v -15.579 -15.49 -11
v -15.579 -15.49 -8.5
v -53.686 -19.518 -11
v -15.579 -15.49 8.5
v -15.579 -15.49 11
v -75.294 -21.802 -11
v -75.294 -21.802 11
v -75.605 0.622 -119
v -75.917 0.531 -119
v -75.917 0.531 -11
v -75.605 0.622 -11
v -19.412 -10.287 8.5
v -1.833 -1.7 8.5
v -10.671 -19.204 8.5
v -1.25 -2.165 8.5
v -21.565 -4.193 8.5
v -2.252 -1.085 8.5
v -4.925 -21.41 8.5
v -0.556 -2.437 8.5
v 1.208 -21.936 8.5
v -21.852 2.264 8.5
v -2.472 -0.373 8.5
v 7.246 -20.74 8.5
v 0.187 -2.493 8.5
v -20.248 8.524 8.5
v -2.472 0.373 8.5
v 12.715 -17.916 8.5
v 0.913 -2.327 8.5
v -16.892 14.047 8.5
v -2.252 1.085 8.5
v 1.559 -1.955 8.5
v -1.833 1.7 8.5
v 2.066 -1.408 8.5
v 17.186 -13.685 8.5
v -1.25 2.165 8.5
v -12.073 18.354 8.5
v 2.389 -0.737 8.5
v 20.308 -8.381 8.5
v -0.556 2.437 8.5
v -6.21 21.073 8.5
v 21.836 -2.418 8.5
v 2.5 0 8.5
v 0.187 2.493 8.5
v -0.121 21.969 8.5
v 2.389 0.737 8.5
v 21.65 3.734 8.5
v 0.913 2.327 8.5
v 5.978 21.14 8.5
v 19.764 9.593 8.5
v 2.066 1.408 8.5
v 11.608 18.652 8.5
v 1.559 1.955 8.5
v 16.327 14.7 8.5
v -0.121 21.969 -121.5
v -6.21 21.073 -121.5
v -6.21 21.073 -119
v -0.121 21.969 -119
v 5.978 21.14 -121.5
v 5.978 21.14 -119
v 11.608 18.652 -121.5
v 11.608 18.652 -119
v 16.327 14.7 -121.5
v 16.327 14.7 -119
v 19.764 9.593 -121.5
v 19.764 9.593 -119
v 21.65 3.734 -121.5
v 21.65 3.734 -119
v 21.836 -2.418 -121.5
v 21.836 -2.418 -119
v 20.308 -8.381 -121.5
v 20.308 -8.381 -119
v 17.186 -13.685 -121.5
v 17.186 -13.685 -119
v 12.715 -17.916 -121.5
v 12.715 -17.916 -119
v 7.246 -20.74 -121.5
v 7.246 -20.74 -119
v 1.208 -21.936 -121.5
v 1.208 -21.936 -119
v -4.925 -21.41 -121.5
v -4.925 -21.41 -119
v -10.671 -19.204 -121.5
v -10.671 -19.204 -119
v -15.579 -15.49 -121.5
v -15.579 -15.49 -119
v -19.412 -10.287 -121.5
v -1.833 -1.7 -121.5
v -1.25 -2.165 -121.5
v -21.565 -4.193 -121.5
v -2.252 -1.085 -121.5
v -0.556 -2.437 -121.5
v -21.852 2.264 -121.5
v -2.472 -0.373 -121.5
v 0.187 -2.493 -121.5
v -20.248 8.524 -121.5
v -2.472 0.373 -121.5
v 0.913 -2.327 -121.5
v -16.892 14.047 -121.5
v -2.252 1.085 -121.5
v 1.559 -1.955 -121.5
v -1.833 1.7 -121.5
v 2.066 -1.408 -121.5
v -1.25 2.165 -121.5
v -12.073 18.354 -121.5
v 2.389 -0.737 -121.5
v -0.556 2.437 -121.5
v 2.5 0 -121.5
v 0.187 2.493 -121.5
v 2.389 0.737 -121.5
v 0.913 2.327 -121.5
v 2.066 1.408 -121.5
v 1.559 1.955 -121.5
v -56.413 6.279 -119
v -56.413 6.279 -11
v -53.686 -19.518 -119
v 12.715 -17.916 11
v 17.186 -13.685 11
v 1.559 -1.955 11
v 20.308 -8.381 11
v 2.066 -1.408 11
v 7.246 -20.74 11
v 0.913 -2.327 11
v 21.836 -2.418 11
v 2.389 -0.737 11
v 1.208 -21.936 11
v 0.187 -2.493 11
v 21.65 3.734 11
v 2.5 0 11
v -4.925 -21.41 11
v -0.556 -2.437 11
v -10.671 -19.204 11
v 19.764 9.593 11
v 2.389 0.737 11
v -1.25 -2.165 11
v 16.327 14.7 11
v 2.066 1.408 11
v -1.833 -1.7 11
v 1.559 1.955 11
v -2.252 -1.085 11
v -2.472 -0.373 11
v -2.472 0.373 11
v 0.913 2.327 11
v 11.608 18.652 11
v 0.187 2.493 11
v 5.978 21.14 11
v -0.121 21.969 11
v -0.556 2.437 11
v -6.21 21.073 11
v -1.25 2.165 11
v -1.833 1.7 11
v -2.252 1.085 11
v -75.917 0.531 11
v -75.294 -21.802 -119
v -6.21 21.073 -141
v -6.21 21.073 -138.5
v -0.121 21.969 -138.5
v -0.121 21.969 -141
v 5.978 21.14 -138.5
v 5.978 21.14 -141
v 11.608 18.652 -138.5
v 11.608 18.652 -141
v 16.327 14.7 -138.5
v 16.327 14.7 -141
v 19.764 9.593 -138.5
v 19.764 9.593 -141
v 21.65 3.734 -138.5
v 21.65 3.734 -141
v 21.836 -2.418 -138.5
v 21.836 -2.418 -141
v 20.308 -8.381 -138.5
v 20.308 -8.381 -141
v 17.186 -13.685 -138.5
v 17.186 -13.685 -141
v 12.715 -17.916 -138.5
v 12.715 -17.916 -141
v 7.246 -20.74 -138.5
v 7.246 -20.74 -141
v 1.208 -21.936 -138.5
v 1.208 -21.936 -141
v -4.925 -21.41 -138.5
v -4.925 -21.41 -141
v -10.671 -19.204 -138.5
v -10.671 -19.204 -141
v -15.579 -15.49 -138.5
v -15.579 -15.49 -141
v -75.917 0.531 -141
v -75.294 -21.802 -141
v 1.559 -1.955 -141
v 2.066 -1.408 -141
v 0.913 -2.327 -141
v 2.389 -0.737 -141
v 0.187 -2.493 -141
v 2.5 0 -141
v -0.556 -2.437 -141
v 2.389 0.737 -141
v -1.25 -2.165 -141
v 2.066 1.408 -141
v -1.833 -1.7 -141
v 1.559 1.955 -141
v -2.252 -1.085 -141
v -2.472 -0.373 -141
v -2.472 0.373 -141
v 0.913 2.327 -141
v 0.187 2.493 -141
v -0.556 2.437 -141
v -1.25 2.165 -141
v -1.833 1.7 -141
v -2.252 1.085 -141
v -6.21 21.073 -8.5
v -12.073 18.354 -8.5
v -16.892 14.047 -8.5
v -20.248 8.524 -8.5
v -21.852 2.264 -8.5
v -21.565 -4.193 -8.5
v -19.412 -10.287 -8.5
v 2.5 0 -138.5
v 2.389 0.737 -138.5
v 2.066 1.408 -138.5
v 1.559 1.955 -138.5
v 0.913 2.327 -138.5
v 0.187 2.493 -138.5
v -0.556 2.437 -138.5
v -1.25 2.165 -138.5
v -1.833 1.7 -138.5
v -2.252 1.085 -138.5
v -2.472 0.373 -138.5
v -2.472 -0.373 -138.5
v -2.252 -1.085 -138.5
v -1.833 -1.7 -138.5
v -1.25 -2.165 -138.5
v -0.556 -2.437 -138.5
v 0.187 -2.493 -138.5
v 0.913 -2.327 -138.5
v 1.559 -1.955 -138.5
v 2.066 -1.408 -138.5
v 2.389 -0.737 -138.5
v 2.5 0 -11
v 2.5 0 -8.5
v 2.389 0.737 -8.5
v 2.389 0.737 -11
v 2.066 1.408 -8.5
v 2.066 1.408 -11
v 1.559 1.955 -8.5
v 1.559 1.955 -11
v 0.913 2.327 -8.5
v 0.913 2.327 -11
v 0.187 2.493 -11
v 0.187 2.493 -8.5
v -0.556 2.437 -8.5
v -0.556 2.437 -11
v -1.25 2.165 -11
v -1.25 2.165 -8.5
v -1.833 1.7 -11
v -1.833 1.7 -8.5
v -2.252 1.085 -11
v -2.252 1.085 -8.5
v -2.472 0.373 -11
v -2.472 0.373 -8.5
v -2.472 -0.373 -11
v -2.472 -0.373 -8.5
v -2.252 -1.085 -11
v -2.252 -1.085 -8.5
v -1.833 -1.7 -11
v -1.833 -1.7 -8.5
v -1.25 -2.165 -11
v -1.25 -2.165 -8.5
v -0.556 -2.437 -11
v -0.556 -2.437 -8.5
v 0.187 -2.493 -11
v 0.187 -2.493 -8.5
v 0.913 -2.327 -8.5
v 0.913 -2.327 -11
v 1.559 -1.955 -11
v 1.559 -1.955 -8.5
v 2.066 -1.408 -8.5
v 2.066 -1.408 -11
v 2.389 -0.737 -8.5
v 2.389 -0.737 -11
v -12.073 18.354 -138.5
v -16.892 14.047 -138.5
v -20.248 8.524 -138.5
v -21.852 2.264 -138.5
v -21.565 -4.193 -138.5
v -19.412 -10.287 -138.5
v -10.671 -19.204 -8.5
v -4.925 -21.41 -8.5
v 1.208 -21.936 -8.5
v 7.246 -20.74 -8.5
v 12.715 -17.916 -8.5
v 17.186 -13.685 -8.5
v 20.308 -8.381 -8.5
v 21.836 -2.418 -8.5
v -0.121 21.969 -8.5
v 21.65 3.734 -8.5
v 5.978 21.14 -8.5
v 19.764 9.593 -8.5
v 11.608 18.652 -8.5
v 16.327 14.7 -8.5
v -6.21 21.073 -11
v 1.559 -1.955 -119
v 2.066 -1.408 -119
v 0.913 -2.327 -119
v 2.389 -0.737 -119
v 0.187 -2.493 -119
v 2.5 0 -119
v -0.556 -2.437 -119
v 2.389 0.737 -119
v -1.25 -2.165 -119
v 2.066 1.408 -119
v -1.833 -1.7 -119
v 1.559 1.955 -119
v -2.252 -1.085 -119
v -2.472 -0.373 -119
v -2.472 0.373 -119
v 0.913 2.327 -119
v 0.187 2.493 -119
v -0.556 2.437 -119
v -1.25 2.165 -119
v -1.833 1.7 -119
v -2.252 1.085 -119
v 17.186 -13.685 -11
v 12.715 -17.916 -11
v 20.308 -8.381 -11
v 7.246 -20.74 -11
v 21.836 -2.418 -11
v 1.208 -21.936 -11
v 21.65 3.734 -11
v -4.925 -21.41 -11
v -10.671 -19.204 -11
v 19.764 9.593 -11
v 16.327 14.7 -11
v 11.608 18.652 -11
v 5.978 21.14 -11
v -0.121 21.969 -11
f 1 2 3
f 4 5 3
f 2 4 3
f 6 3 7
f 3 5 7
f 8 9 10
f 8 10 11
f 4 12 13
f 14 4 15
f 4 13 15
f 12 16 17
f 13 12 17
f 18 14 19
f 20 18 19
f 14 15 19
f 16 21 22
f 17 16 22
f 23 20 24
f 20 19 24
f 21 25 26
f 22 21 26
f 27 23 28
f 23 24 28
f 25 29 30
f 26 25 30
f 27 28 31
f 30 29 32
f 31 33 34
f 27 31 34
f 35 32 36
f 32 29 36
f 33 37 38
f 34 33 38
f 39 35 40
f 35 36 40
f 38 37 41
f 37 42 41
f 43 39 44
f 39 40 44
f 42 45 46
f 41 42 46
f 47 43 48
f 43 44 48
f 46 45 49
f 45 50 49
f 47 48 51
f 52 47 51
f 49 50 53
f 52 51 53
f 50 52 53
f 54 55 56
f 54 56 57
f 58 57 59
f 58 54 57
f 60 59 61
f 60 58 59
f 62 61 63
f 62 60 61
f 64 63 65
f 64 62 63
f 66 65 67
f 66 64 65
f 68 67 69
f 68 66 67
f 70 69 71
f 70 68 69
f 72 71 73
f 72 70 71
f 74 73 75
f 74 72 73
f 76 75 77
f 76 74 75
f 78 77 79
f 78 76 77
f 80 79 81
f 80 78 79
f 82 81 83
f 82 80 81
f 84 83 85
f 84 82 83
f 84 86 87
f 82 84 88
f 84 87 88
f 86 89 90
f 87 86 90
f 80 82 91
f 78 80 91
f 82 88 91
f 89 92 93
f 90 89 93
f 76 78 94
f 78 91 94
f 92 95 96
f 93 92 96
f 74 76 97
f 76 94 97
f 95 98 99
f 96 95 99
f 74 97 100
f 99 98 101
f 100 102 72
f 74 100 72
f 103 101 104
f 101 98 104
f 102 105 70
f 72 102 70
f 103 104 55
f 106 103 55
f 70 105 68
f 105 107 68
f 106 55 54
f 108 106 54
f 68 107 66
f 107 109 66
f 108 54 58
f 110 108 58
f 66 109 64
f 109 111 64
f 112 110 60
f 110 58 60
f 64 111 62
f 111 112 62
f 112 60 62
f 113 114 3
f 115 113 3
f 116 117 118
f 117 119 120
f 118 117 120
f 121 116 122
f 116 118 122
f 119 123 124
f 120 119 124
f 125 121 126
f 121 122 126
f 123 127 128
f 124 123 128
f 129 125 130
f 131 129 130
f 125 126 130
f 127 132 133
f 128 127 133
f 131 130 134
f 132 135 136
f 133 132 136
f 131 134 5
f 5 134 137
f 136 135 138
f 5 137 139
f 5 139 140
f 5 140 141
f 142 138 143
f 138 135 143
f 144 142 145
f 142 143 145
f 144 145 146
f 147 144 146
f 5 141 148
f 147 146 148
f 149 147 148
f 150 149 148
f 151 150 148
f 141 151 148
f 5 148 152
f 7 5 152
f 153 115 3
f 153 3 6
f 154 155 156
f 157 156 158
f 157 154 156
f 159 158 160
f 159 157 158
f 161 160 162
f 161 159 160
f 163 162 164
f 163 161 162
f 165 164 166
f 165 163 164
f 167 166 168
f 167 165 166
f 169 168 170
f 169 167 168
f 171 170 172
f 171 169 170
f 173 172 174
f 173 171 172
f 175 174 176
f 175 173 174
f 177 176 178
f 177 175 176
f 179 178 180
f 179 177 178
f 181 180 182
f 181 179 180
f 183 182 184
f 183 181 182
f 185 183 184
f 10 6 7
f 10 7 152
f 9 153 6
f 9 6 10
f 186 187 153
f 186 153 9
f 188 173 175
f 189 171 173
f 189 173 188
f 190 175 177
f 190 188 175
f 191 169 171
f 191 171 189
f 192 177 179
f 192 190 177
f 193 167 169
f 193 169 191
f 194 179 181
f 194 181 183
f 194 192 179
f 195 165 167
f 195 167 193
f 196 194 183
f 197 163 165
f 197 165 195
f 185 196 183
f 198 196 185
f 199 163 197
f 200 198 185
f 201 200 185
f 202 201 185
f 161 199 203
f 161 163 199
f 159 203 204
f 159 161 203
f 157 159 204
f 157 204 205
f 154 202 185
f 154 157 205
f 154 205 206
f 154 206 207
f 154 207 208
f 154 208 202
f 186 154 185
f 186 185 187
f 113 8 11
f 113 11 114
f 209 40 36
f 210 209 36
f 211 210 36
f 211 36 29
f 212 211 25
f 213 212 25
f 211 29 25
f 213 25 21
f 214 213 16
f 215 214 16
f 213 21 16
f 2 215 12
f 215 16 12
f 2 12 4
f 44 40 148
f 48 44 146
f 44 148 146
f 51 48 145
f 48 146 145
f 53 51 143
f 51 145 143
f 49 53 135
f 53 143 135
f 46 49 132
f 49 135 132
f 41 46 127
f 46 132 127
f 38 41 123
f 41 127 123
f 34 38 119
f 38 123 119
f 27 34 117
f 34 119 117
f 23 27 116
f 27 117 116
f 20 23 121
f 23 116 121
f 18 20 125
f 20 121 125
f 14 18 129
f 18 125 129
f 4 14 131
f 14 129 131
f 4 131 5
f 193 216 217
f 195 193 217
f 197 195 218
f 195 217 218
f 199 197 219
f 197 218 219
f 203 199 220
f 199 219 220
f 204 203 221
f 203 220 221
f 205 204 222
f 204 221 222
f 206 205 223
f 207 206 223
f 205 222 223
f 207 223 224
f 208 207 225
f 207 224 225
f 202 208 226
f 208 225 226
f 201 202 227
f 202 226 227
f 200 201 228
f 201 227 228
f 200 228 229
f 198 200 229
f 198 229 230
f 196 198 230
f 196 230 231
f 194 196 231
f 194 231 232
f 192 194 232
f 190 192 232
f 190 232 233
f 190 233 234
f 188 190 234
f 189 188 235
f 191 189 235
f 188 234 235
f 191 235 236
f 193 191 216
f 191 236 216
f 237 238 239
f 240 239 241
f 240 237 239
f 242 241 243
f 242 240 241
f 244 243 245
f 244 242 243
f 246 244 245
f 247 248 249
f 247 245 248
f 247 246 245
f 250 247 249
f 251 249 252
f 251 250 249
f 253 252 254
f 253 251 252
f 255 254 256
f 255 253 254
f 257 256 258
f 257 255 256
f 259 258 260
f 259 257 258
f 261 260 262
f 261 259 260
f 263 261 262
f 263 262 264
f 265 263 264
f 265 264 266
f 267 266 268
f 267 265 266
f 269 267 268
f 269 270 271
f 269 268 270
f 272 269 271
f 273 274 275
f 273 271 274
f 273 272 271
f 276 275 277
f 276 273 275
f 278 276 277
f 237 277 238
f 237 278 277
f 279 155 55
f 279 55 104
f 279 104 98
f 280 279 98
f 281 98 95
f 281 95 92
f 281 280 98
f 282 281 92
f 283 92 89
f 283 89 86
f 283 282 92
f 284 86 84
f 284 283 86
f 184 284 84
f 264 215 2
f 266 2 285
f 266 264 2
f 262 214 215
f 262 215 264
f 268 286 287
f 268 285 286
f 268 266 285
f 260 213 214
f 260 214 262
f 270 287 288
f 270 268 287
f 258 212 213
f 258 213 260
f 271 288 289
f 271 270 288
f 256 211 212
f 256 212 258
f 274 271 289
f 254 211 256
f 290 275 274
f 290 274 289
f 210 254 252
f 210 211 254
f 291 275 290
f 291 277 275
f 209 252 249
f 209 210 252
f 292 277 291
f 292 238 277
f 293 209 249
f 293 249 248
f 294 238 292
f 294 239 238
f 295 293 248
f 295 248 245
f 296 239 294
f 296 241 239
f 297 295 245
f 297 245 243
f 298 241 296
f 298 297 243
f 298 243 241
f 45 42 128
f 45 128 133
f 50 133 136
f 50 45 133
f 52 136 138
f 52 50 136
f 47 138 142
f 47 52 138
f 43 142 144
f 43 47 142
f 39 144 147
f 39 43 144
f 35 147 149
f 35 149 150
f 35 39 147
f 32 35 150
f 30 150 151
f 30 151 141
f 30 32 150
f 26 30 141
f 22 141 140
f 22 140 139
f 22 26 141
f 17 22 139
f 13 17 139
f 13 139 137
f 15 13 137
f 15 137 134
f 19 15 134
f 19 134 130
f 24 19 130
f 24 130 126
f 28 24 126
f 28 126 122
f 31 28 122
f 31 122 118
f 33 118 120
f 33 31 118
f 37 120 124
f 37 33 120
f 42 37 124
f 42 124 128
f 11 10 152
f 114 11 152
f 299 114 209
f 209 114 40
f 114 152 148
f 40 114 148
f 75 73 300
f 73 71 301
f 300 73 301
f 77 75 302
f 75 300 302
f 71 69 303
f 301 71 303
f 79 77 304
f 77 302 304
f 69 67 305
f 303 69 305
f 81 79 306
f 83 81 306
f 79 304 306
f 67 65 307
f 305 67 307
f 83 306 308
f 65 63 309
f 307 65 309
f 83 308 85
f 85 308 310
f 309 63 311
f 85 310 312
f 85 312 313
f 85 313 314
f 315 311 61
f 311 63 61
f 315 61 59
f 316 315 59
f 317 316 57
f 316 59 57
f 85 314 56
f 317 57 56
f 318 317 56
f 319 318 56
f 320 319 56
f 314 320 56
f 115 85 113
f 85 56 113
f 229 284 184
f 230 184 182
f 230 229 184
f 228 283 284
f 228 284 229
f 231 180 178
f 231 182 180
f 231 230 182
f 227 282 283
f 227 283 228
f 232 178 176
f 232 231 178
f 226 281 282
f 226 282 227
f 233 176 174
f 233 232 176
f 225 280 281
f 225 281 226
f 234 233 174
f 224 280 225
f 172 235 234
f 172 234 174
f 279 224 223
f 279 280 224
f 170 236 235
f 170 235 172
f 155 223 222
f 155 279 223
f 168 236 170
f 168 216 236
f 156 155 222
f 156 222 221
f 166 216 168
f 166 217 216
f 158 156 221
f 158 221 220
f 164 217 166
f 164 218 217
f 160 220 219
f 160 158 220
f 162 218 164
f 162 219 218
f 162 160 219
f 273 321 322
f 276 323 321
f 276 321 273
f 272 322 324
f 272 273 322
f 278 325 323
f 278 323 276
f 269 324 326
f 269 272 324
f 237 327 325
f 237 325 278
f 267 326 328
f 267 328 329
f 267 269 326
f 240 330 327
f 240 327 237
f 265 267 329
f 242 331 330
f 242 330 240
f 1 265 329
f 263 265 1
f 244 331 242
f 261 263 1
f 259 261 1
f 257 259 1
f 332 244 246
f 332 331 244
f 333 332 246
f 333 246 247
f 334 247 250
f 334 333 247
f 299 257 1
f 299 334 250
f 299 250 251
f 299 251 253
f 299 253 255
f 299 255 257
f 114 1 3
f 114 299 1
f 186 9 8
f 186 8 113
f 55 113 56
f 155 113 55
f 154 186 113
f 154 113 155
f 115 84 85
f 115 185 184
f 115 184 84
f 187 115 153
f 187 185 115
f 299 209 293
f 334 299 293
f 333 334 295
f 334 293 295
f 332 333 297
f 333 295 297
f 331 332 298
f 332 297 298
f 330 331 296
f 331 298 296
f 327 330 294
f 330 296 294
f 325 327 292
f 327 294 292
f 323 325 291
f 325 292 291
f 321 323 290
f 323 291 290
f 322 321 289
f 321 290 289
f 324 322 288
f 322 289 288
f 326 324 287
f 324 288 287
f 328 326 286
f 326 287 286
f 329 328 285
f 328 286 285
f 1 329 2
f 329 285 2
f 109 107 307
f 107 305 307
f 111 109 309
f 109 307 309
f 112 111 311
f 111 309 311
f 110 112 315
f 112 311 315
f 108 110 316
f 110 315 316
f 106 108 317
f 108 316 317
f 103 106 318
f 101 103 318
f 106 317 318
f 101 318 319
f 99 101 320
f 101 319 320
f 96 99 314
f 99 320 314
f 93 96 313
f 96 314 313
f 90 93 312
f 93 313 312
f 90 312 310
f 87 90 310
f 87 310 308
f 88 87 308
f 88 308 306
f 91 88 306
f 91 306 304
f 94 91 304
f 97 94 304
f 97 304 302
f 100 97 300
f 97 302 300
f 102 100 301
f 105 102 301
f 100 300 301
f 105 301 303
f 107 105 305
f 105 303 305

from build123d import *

# Parameters (mm, degrees)
SKETCH1_R           = 2.5
BOSS_EXTRUDE1_DEPTH = 11
SKETCH2_R           = 21.969303103
CUT_EXTRUDE1_DEPTH  = 8.5
BOSS_EXTRUDE2_DEPTH = 54


with BuildPart() as part:
    # Sketch1 → Boss-Extrude1 (new body, symmetric)
    with BuildSketch(Plane.XY):
        with BuildLine():
            Line((-75.294135102, -21.801947472), (-75.916524457, 0.530755))
            Line((-75.916524457, 0.530755), (-6.210315137, 21.073259471))
            ThreePointArc((-6.210315137, 21.073259471), (21.281751318, -5.453195364), (-15.579203419, -15.489954799))
            Line((-15.579203419, -15.489954799), (-75.294135102, -21.801947472))
        make_face()
        Circle(SKETCH1_R, mode=Mode.SUBTRACT)
    boss_extrude1 = extrude(amount=BOSS_EXTRUDE1_DEPTH, both=True)

    # Sketch2 → Cut-Extrude1 (cut, symmetric)
    with BuildSketch(Plane.XY):
        Circle(SKETCH2_R)
    cut_extrude1 = extrude(amount=CUT_EXTRUDE1_DEPTH, both=True, mode=Mode.SUBTRACT)

    # Sketch3 → Boss-Extrude2 (add)
    with BuildSketch(Plane(origin=(0, 0, -11), x_dir=(-1, 0, 0), z_dir=(0, 0, -1))):
        Polygon((75.294135102, -21.801947472), (75.916524457, 0.530755), (75.60532978, 0.622464449), (56.412661227, 6.278567161), (53.685919424, -19.517914062), align=None)
    boss_extrude2 = extrude(amount=BOSS_EXTRUDE2_DEPTH)

    # Mirror3: Boss-Extrude1, Cut-Extrude1, Boss-Extrude2 across plane
    add(boss_extrude1.mirror(Plane(origin=(-98.145469491, -3.551481911, -65), x_dir=(1, 0, 0), z_dir=(0, 0, 1))))
    add(cut_extrude1.mirror(Plane(origin=(-98.145469491, -3.551481911, -65), x_dir=(1, 0, 0), z_dir=(0, 0, 1))), mode=Mode.SUBTRACT)
    add(boss_extrude2.mirror(Plane(origin=(-98.145469491, -3.551481911, -65), x_dir=(1, 0, 0), z_dir=(0, 0, 1))))


solid = part.part
